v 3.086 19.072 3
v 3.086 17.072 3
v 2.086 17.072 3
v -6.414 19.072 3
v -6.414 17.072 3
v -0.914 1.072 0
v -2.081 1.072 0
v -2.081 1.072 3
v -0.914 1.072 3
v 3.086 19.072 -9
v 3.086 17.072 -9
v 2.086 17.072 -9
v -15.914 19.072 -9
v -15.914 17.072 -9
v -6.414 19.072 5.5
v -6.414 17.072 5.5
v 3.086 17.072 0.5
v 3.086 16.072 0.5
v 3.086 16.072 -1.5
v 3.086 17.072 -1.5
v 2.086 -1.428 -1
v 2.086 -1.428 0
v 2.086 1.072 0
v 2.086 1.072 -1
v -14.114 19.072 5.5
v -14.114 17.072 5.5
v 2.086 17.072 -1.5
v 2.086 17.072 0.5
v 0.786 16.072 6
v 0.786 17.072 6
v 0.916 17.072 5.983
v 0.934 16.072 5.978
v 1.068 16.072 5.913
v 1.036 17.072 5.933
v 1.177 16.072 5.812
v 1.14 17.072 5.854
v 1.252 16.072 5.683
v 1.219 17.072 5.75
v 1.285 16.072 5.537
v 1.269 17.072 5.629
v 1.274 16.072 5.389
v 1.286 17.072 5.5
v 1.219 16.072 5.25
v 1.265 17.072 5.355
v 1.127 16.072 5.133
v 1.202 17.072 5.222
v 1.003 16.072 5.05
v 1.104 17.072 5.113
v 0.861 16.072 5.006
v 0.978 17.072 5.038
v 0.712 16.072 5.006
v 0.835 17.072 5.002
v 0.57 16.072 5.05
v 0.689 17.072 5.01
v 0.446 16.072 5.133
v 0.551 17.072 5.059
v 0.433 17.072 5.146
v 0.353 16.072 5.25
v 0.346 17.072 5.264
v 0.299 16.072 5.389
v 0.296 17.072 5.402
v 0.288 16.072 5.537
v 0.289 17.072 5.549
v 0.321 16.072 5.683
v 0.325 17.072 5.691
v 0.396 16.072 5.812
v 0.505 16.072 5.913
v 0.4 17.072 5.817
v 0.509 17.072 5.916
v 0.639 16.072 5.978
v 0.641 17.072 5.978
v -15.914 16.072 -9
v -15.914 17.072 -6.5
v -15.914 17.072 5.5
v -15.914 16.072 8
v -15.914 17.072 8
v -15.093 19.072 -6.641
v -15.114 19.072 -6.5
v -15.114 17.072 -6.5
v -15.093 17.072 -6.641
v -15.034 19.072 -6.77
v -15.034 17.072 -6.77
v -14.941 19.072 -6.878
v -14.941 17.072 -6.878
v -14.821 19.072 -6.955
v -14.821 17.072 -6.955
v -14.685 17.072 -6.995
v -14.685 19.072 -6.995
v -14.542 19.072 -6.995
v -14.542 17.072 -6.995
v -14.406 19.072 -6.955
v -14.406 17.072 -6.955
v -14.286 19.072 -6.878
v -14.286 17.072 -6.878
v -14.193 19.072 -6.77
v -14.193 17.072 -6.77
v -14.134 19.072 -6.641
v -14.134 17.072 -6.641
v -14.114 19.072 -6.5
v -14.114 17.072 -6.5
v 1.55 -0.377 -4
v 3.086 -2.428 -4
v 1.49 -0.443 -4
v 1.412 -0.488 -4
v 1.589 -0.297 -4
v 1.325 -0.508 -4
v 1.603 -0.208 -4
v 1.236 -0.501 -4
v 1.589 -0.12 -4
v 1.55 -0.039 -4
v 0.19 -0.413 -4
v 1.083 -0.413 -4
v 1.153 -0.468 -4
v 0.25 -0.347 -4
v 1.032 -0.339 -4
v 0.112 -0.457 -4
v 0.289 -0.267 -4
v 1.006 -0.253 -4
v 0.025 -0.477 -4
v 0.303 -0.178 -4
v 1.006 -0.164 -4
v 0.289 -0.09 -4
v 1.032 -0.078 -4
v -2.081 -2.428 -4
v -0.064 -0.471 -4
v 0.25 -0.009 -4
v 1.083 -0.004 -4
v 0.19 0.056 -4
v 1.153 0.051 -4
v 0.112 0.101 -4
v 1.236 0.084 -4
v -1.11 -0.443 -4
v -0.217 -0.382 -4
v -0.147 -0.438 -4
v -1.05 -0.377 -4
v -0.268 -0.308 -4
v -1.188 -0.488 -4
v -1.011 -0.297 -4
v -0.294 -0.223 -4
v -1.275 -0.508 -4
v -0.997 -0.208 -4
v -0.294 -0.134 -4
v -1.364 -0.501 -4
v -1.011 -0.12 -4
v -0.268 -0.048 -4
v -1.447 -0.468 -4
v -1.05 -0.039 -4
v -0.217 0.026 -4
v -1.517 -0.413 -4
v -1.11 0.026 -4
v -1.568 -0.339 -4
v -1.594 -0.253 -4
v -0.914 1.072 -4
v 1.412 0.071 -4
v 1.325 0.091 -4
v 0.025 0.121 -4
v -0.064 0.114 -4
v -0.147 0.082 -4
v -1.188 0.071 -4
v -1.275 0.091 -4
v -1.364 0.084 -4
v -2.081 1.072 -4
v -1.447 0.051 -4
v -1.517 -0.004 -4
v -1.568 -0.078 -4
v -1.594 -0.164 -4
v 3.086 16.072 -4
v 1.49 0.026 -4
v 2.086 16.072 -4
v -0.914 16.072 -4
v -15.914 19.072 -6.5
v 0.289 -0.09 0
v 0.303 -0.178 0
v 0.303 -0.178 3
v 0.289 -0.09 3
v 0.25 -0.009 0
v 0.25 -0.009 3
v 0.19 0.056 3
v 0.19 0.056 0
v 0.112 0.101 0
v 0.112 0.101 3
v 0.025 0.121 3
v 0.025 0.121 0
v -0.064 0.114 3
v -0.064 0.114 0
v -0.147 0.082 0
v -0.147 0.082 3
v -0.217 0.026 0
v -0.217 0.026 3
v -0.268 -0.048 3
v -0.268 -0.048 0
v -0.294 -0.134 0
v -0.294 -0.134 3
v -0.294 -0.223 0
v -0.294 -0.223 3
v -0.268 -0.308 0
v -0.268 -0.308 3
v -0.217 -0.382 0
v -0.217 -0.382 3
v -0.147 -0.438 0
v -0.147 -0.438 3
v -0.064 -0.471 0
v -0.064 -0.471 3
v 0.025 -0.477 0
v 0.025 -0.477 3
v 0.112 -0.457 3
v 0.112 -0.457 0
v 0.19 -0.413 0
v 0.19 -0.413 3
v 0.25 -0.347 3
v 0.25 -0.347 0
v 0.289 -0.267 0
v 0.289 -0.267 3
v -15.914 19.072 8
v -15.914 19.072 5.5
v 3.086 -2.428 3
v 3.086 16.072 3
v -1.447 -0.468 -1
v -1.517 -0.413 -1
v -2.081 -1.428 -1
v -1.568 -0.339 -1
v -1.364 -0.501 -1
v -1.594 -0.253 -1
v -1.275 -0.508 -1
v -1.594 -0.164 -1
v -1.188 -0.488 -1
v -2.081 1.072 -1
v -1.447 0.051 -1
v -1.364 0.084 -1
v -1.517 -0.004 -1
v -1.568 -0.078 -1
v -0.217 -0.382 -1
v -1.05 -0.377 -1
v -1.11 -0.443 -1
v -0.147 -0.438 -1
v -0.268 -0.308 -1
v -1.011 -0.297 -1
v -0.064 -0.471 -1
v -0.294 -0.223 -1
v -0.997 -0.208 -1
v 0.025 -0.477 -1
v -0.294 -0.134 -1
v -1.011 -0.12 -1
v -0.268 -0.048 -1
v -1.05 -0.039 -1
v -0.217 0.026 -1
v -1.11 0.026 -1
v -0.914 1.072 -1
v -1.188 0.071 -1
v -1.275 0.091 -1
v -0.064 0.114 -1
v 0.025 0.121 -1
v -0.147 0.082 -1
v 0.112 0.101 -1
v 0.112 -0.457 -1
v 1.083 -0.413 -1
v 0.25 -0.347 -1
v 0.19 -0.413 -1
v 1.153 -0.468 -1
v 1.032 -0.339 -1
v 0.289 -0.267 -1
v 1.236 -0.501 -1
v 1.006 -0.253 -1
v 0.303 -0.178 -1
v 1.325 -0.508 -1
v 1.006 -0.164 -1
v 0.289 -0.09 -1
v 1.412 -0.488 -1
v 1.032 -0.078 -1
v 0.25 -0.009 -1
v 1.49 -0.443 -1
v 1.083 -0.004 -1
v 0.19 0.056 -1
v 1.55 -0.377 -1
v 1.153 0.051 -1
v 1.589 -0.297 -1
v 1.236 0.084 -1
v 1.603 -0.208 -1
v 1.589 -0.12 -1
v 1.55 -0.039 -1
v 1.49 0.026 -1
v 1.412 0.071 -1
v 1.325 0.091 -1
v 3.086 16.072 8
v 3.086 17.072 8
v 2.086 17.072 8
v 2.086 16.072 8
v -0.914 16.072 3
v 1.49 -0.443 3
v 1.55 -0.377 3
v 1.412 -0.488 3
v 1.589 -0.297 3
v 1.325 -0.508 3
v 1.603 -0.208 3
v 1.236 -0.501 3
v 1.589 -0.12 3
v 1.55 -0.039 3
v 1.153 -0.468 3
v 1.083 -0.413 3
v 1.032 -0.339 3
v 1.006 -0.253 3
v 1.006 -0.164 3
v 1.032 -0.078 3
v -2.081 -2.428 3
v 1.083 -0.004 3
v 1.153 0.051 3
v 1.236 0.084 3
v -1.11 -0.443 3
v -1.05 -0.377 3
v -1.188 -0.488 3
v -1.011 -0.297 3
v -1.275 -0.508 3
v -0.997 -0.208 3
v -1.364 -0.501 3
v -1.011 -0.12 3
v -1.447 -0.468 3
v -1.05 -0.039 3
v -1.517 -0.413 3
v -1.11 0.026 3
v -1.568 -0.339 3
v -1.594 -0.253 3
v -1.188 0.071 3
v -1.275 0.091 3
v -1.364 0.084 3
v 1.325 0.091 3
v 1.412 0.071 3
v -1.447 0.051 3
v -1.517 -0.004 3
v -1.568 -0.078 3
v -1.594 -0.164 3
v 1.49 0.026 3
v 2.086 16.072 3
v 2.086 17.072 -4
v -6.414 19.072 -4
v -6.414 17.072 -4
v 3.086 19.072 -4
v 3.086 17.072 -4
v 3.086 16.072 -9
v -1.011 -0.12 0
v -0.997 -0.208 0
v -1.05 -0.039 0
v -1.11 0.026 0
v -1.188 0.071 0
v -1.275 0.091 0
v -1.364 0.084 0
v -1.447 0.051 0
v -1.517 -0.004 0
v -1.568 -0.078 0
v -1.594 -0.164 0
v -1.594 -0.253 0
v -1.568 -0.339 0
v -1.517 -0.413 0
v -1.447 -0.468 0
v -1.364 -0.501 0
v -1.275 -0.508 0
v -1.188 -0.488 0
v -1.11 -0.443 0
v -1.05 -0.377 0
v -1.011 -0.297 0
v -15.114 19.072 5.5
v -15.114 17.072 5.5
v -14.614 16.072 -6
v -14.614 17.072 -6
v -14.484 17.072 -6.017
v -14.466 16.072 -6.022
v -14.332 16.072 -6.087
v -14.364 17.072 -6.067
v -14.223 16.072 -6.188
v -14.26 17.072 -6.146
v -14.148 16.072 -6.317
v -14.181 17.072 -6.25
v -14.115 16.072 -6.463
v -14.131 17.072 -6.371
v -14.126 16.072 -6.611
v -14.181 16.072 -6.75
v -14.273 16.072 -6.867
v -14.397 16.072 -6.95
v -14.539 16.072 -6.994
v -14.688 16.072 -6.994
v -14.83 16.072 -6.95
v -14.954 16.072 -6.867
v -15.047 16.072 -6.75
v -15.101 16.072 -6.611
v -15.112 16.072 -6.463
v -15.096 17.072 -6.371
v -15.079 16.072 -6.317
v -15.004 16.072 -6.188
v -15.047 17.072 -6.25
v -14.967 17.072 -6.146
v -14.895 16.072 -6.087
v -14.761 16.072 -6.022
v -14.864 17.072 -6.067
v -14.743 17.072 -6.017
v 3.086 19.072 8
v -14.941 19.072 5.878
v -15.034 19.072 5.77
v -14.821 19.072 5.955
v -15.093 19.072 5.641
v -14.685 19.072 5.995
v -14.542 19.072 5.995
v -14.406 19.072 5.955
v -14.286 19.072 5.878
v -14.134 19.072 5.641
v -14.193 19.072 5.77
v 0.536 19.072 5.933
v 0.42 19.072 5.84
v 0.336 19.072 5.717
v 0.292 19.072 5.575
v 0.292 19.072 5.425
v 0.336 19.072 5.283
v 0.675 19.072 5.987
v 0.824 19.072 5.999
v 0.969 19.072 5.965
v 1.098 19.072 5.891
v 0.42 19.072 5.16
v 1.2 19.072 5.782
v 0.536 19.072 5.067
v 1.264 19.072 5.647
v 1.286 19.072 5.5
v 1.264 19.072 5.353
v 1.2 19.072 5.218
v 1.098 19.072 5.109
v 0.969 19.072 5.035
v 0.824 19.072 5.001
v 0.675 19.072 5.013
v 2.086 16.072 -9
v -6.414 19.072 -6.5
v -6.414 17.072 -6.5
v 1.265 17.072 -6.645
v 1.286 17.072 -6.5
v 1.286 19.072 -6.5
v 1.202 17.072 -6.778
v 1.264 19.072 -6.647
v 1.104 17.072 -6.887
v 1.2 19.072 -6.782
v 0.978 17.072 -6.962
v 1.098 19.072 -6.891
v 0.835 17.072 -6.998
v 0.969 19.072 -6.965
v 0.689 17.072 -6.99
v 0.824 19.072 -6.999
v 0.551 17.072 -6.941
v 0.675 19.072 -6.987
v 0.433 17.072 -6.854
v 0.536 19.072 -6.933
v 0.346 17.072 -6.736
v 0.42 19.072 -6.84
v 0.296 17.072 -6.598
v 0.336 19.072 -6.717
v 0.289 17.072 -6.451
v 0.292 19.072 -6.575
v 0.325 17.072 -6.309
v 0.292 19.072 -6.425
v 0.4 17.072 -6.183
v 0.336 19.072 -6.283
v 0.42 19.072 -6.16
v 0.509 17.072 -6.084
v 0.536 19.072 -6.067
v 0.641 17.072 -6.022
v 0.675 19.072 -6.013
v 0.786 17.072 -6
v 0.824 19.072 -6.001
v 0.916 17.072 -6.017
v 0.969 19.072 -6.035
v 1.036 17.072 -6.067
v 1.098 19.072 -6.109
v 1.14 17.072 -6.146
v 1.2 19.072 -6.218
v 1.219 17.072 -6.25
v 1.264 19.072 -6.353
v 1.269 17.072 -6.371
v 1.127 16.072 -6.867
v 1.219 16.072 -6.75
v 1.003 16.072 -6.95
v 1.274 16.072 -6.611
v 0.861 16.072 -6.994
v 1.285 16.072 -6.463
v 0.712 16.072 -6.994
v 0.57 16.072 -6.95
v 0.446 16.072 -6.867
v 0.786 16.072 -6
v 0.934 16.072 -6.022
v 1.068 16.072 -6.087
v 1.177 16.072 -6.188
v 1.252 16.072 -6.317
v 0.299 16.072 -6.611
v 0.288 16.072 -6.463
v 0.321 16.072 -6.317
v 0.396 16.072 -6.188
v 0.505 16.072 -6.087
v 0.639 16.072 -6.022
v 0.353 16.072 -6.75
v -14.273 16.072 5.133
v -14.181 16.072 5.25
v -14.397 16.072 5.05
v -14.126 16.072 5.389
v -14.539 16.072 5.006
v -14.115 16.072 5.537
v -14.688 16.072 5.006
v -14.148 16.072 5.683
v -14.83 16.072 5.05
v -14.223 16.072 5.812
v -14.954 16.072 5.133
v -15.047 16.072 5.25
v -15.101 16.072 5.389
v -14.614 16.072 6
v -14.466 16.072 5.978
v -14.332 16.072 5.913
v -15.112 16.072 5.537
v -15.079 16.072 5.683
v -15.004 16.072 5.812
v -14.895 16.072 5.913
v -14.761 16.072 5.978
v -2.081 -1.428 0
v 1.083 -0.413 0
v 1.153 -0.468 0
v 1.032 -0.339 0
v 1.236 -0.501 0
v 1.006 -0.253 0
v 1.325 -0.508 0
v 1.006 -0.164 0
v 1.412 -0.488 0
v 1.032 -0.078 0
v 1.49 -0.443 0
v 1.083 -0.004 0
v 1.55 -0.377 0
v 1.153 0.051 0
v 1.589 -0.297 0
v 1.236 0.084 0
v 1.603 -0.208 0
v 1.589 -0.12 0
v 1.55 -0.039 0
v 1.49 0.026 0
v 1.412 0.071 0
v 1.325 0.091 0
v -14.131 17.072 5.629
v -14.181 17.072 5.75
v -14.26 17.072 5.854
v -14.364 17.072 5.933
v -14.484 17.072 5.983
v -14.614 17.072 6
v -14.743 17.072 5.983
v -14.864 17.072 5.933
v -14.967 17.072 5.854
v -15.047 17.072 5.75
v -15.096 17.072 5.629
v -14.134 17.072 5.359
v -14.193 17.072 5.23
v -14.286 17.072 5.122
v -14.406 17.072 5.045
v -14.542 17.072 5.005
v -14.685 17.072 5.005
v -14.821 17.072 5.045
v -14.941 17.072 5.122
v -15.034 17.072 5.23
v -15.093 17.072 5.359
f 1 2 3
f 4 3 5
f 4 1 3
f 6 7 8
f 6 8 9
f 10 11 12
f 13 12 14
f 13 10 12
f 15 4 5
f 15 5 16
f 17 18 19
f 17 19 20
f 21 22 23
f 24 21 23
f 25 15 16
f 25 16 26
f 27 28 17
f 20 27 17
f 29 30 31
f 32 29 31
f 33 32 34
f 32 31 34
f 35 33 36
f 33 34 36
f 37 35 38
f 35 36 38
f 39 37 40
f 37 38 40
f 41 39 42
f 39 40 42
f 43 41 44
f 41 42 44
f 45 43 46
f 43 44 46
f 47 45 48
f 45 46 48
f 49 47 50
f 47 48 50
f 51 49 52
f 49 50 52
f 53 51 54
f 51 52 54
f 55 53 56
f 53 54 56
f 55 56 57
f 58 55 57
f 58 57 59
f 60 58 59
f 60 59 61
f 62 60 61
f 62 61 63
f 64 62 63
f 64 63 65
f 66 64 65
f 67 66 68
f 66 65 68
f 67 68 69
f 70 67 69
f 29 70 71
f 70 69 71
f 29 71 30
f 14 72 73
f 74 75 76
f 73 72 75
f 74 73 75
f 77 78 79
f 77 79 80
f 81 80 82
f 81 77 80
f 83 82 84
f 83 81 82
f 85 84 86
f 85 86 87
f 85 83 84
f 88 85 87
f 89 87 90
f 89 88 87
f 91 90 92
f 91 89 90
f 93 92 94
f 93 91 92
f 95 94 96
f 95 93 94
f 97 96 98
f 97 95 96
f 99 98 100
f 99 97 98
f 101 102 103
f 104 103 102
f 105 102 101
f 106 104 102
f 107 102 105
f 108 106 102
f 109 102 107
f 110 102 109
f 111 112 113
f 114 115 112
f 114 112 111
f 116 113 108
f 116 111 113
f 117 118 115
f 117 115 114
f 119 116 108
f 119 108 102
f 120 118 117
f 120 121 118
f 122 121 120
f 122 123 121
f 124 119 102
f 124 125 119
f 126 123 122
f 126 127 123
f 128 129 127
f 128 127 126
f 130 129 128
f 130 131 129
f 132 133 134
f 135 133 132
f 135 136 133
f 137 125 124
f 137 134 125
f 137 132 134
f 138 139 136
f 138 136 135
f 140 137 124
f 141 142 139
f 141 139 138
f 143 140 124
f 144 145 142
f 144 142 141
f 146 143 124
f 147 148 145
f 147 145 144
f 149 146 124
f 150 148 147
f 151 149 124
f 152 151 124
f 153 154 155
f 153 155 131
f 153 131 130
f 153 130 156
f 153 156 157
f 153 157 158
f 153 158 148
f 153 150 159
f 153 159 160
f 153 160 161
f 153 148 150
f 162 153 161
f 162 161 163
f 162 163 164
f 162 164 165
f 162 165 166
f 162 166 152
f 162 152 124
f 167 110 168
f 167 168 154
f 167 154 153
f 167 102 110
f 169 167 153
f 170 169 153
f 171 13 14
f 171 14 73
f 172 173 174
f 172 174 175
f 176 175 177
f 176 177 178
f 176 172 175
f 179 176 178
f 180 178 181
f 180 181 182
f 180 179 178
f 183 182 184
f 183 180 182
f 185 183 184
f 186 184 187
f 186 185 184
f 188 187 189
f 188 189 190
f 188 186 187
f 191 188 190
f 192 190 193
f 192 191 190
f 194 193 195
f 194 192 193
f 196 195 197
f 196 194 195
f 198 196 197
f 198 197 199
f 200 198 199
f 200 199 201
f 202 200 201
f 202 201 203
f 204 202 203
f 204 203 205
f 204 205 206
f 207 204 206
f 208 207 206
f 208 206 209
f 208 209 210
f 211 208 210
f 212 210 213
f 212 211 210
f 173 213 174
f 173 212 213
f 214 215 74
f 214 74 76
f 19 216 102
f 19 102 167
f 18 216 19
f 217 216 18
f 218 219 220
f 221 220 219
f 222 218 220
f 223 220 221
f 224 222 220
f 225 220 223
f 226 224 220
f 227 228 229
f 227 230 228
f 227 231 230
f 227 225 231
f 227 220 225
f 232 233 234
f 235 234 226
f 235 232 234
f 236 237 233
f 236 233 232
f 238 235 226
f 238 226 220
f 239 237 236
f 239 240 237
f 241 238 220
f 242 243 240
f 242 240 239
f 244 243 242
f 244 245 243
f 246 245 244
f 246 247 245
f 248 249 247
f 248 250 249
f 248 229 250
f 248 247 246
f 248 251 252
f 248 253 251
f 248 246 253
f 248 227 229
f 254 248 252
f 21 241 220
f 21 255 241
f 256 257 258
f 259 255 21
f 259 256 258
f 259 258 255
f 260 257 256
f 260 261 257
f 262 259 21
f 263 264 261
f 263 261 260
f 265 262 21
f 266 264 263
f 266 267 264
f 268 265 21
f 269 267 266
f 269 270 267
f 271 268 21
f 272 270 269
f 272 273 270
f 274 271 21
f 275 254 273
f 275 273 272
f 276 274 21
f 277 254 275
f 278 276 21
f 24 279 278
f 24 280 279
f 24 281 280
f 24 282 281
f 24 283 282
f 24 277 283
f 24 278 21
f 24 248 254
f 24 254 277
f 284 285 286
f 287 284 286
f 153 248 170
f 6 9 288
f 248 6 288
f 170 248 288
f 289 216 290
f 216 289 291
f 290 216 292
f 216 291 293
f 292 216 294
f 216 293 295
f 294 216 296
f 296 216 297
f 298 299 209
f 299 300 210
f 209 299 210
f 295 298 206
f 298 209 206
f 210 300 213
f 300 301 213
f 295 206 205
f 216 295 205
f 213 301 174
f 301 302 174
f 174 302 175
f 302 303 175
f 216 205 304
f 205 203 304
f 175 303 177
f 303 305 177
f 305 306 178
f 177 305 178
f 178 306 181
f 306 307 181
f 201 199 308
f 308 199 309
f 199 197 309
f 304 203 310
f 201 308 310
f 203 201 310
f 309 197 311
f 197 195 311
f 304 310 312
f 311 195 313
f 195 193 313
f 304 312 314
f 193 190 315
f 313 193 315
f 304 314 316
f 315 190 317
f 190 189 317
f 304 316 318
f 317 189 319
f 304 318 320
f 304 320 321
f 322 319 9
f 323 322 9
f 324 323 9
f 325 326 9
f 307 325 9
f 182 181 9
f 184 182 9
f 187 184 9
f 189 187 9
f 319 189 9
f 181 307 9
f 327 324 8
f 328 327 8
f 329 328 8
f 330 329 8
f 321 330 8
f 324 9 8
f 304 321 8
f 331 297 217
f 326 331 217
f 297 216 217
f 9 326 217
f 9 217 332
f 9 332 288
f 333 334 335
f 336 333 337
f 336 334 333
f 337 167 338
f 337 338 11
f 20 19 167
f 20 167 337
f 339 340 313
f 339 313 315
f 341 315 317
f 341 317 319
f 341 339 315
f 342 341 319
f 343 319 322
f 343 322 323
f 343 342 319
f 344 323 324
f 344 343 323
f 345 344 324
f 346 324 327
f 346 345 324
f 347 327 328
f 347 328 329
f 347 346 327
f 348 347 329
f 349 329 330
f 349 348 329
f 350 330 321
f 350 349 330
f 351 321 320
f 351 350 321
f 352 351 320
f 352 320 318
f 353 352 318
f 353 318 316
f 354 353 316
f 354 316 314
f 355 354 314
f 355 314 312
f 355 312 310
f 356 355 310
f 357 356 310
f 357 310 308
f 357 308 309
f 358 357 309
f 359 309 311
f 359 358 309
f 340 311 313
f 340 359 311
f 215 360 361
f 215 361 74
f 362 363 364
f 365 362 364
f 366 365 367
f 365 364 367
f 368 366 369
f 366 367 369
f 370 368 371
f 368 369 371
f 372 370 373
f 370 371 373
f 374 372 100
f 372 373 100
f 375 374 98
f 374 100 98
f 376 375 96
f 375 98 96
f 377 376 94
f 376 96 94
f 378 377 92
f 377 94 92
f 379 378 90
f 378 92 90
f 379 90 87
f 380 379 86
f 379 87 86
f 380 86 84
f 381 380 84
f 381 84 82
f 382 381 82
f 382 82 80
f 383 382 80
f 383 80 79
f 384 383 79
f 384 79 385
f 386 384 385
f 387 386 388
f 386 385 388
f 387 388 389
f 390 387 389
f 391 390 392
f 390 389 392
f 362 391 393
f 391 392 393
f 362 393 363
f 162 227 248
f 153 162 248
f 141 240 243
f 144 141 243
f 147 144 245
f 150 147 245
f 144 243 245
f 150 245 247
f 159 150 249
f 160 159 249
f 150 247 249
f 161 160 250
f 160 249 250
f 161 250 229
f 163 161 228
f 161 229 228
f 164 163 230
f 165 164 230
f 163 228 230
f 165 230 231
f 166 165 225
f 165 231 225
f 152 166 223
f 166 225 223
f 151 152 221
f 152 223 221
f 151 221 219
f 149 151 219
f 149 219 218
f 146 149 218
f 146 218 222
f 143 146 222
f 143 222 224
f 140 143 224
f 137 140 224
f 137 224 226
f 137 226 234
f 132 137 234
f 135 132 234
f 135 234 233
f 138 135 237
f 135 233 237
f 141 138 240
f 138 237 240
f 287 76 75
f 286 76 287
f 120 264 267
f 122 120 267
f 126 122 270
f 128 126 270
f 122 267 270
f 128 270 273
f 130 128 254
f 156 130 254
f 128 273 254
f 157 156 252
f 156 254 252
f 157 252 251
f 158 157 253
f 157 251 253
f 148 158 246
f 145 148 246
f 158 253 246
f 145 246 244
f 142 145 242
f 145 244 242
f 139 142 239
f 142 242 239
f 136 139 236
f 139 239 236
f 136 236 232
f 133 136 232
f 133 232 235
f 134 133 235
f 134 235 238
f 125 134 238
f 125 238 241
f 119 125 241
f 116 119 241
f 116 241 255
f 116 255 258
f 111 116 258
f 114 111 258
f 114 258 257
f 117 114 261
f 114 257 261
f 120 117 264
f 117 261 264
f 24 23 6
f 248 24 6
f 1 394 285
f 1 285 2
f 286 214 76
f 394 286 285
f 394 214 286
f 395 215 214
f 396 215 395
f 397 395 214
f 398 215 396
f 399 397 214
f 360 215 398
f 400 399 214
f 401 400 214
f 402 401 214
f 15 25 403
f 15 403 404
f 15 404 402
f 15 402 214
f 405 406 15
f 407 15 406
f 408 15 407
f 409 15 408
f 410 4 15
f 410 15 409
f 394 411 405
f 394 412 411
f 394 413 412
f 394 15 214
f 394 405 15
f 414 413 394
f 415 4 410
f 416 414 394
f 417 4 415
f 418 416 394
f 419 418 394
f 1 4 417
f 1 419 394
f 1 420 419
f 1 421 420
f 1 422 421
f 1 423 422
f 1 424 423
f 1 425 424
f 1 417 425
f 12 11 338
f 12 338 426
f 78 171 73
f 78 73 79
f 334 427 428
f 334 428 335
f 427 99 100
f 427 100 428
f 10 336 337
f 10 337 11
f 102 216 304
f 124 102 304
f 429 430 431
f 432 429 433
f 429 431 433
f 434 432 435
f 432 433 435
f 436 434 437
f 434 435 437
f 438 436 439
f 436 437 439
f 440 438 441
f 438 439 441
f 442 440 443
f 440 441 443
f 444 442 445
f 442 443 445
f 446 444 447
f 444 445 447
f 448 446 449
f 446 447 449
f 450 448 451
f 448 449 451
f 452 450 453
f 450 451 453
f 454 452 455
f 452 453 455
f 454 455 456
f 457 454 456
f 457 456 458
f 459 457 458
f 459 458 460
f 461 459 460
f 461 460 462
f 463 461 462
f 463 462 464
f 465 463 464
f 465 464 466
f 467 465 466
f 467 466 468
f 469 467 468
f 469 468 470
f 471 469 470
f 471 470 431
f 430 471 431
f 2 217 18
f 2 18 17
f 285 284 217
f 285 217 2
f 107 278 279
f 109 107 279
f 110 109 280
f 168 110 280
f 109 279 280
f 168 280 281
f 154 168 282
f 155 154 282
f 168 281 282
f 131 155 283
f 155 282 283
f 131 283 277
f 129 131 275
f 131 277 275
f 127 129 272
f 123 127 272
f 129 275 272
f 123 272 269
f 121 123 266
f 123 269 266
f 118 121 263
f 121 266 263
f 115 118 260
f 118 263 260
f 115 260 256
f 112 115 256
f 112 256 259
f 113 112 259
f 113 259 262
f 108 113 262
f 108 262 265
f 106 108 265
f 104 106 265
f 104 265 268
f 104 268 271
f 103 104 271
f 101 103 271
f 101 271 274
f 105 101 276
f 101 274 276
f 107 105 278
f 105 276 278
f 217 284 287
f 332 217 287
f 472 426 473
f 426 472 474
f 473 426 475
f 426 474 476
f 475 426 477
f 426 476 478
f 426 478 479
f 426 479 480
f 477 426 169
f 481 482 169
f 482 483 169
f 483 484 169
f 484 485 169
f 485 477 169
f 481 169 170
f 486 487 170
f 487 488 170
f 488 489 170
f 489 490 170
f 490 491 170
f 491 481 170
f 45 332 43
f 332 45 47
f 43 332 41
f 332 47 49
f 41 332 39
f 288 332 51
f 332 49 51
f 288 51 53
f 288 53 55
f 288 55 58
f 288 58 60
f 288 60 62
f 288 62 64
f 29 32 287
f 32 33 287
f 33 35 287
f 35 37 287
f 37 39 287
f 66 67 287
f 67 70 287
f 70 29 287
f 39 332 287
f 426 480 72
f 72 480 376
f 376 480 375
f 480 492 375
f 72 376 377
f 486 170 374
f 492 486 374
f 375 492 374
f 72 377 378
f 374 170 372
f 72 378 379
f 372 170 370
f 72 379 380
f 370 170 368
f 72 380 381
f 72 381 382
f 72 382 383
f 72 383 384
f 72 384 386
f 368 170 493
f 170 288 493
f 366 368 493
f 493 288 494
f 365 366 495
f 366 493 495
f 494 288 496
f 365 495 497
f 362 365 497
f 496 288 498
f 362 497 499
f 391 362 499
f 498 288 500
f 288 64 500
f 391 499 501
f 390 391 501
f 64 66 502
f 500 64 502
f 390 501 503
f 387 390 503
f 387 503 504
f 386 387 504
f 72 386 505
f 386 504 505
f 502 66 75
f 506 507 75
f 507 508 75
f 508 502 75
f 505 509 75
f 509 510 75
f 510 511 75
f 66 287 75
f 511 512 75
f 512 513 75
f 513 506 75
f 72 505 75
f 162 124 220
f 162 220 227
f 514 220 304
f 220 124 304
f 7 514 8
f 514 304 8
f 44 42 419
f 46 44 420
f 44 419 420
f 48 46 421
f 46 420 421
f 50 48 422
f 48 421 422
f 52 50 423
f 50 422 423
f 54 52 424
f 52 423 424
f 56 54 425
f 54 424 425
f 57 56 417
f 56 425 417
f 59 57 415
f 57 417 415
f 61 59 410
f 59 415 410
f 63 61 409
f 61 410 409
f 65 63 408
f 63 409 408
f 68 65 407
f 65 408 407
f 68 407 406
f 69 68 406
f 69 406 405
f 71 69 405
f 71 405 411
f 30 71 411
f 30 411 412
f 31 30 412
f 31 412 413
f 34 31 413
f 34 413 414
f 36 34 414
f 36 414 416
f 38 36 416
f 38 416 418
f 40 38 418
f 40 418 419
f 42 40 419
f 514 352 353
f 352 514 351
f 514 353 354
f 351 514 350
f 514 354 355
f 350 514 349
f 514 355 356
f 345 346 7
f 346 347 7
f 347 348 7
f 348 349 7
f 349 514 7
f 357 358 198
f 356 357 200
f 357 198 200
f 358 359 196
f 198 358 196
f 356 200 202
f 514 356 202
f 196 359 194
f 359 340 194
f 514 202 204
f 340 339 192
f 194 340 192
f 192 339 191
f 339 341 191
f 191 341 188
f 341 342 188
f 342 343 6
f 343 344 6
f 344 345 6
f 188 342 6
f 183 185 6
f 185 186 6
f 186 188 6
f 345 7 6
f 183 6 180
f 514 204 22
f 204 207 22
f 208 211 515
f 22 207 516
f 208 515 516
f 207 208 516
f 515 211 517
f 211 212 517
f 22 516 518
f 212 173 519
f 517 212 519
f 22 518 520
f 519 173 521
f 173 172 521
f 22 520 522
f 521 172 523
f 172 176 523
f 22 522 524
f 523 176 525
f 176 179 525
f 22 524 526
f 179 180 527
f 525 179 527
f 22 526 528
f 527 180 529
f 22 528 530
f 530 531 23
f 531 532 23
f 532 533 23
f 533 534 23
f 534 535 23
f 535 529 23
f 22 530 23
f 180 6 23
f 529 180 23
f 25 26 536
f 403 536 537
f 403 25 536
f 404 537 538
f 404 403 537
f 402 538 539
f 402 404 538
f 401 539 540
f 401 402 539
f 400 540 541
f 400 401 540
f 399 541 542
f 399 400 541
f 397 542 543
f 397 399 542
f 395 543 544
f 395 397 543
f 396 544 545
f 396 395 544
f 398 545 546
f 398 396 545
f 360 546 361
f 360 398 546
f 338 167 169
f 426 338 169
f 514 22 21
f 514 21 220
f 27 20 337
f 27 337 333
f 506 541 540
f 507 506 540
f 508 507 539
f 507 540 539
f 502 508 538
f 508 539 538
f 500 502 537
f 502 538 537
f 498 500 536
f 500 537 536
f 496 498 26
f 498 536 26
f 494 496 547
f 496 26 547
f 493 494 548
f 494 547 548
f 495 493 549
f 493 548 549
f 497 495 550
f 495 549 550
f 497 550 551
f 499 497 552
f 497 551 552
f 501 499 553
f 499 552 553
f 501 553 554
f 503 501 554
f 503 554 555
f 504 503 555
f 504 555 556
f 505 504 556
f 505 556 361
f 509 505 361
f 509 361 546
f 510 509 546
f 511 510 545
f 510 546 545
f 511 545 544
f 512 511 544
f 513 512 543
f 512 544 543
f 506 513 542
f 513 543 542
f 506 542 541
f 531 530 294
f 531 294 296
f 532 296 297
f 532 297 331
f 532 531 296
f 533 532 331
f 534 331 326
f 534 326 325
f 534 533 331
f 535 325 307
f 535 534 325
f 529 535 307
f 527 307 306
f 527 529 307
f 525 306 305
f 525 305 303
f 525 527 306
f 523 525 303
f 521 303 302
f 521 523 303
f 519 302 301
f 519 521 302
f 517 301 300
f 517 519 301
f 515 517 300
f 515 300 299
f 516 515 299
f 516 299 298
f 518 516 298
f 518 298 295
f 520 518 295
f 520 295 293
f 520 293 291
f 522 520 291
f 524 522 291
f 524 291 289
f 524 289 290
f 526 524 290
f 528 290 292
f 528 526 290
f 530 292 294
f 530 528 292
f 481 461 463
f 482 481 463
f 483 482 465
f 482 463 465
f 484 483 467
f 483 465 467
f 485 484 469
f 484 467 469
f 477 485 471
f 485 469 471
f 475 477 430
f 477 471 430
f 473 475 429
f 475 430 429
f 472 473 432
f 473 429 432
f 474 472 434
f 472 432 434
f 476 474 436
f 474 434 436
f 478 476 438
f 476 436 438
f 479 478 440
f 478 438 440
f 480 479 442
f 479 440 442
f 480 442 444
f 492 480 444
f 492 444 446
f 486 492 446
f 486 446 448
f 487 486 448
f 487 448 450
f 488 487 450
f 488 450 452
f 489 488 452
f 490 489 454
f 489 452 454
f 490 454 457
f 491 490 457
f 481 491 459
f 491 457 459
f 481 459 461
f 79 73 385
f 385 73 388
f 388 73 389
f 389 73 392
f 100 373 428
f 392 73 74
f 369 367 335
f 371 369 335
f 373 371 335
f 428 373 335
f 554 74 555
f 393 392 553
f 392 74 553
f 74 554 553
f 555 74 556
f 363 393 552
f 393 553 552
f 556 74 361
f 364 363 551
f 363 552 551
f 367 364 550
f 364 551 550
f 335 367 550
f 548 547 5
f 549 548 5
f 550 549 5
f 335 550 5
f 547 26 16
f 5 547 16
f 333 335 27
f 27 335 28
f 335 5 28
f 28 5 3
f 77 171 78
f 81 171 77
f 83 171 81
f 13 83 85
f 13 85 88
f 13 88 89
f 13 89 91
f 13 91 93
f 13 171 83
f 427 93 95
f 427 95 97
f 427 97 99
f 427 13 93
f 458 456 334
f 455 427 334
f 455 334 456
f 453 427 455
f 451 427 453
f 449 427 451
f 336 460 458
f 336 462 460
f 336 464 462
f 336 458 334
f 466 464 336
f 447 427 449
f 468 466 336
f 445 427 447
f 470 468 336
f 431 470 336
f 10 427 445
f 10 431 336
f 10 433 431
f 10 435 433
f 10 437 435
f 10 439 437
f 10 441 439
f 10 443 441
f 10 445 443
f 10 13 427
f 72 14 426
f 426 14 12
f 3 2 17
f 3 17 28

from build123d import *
from build123d.topology import SkipClean

# Parameters (mm, degrees)
SKETCH3_W                = 4.167944103
SKETCH3_H                = 2.5
SKETCH3_R                = 0.3
BOSS_EXTRUDE1_DEPTH      = 3
SKETCH6_W                = 3
SKETCH6_H                = 15
BOSS_EXTRUDE3_DEPTH      = 3
BOSS_EXTRUDE4_DEPTH      = 8
SKETCH7_R                = 0.5
CUT_EXTRUDE1_DEPTH       = 1
BOSS_EXTRUDE5_DEPTH      = 1
BOSS_EXTRUDE5_DEPTH_BACK = 1
BOSS_EXTRUDE6_DEPTH      = 3.5
BOSS_EXTRUDE6_DEPTH_BACK = 3.5
SKETCH8_5_W              = 4.167944103
SKETCH8_5_H              = 1
BOSS_EXTRUDE7_DEPTH      = 3.5
BOSS_EXTRUDE7_DEPTH_BACK = 3.5
BOSS_EXTRUDE8_START      = 2
SKETCH9_R                = 0.5
BOSS_EXTRUDE8_DEPTH      = 2
BOSS_EXTRUDE9_DEPTH      = 8.5
BOSS_EXTRUDE9_DEPTH_BACK = 8.5
SKETCH8_7_W              = 1
SKETCH8_7_H              = 1


with BuildPart() as part:
    # Sketch3 → Boss-Extrude1 (new body)
    with BuildSketch(Plane.XY):
        with Locations((0.002500359, -0.178234892)):
            Rectangle(SKETCH3_W, SKETCH3_H)
        with Locations((-1.297499642, -0.208485146)):
            Circle(SKETCH3_R, mode=Mode.SUBTRACT)
        with Locations((1.302500358, -0.208485146)):
            Circle(SKETCH3_R, mode=Mode.SUBTRACT)
        with Locations((0.002500358, -0.178234892)):
            Circle(SKETCH3_R, mode=Mode.SUBTRACT)
    extrude(amount=BOSS_EXTRUDE1_DEPTH)

    # Sketch6 → Boss-Extrude3 (add)
    with BuildSketch(Plane.XY):
        with Locations((0.58647241, 8.571765108)):
            Rectangle(SKETCH6_W, SKETCH6_H)
        Polygon((-0.91352759, 16.071765108), (2.08647241, 16.071765108), (2.08647241, 17.071765108), (-15.91352759, 17.071765108), (-15.91352759, 16.071765108), align=None)
    extrude(amount=BOSS_EXTRUDE3_DEPTH)

    # Sketch6<5> → Boss-Extrude4 (add)
    with BuildSketch(Plane.XY):
        Polygon((-0.91352759, 16.071765108), (2.08647241, 16.071765108), (2.08647241, 17.071765108), (-15.91352759, 17.071765108), (-15.91352759, 16.071765108), align=None)
    extrude(amount=BOSS_EXTRUDE4_DEPTH)


with BuildPart() as body_2:
    # Mirror4: mirrored copy
    add(part.part.mirror(Plane(origin=(0, 0, -0.5), x_dir=(1, 0, 0), z_dir=(0, 0, -1))))


with BuildPart() as cut_extrude1_tool:
    # Sketch7 → Cut-Extrude1 (new body)
    with BuildSketch(Plane(origin=(0, 17.071765108, 0), x_dir=(1, 0, 0), z_dir=(0, 1, 0))):
        with Locations((-14.61352759, -5.5)):
            Circle(SKETCH7_R)
        with Locations((-14.61352759, 6.5)):
            Circle(SKETCH7_R)
        with Locations((0.78647241, -5.5)):
            Circle(SKETCH7_R)
        with Locations((0.78647241, 6.5)):
            Circle(SKETCH7_R)
    extrude(amount=-CUT_EXTRUDE1_DEPTH)


with BuildPart() as part_1:
    add(part.part)

    # Cut-Extrude1: cut by cut_extrude1_tool
    add(cut_extrude1_tool.part, mode=Mode.SUBTRACT)



with BuildPart() as body_2_1:
    add(body_2.part)

    # Cut-Extrude1: cut by cut_extrude1_tool
    add(cut_extrude1_tool.part, mode=Mode.SUBTRACT)


with BuildPart() as part_2:
    add(part_1.part)

    add(body_2_1.part)  # Boss-Extrude5 merges body 2
    # Sketch8 → Boss-Extrude5 (add, two sides: drawn at the far end of the back side and taken through both)
    with BuildSketch(Plane(origin=(0, 0, -0.5), x_dir=(-1, 0, 0), z_dir=(0, 0, -1)).offset(-BOSS_EXTRUDE5_DEPTH_BACK)):
        Polygon((2.081471693, -2.428234892), (2.081471693, -1.428234892), (-2.08647241, -1.428234892), (-2.08647241, 1.071765108), (0.91352759, 1.071765108), (0.91352759, 16.071765108), (15.91352759, 16.071765108), (15.91352759, 17.071765108), (-3.08647241, 17.071765108), (-3.08647241, -2.428234892), align=None)
    extrude(amount=BOSS_EXTRUDE5_DEPTH + BOSS_EXTRUDE5_DEPTH_BACK)

    # Sketch8<5> → Boss-Extrude6 (add, two sides: drawn at the far end of the back side and taken through both)
    with BuildSketch(Plane(origin=(0, 0, -0.5), x_dir=(-1, 0, 0), z_dir=(0, 0, -1)).offset(-BOSS_EXTRUDE6_DEPTH_BACK)):
        with Locations((-0.002500359, -1.928234892)):
            Rectangle(SKETCH8_5_W, SKETCH8_5_H)
    extrude(amount=BOSS_EXTRUDE6_DEPTH + BOSS_EXTRUDE6_DEPTH_BACK)

    # Sketch8<6> → Boss-Extrude7 (add, two sides: drawn at the far end of the back side and taken through both)
    with BuildSketch(Plane(origin=(0, 0, -0.5), x_dir=(-1, 0, 0), z_dir=(0, 0, -1)).offset(-BOSS_EXTRUDE7_DEPTH_BACK)):
        Polygon((-2.08647241, -2.428234892), (-2.08647241, -1.428234892), (-2.08647241, 1.071765108), (-2.08647241, 16.071765108), (-3.08647241, 16.071765108), (-3.08647241, -2.428234892), align=None)
    extrude(amount=BOSS_EXTRUDE7_DEPTH + BOSS_EXTRUDE7_DEPTH_BACK)

    # Sketch9 → Boss-Extrude8 (add)
    # profile 1 of 2: a face of its own
    with SkipClean():  # the faces are left unmerged after this step: merging them gives an invalid solid
        with BuildSketch(Plane(origin=(0, 17.071765108, 0), x_dir=(1, 0, 0), z_dir=(0, 1, 0)).offset(BOSS_EXTRUDE8_START)):
            with BuildLine():
                Line((-15.11352759, -5.5), (-15.91352759, -5.5))
                Line((-15.91352759, -5.5), (-15.91352759, -8))
                Line((-15.91352759, -8), (3.08647241, -8))
                Line((3.08647241, -8), (3.08647241, -3))
                Line((3.08647241, -3), (-6.41352759, -3))
                Line((-6.41352759, -3), (-6.41352759, -5.5))
                Line((-6.41352759, -5.5), (-14.11352759, -5.5))
                ThreePointArc((-14.11352759, -5.5), (-14.61352759, -6), (-15.11352759, -5.5))
            make_face()
            with Locations((0.78647241, -5.5)):
                Circle(SKETCH9_R, mode=Mode.SUBTRACT)
        # profile 2 of 2: a face of its own
        with BuildSketch(Plane(origin=(0, 17.071765108, 0), x_dir=(1, 0, 0), z_dir=(0, 1, 0)).offset(BOSS_EXTRUDE8_START)):
            with BuildLine():
                Line((-6.41352759, 6.5), (-6.41352759, 4))
                Line((-6.41352759, 4), (3.08647241, 4))
                Line((3.08647241, 4), (3.08647241, 9))
                Line((3.08647241, 9), (-15.91352759, 9))
                Line((-15.91352759, 9), (-15.91352759, 6.5))
                Line((-15.91352759, 6.5), (-15.11352759, 6.5))
                ThreePointArc((-15.11352759, 6.5), (-14.61352759, 7), (-14.11352759, 6.5))
                Line((-14.11352759, 6.5), (-6.41352759, 6.5))
            make_face()
            with Locations((0.78647241, 6.5)):
                Circle(SKETCH9_R, mode=Mode.SUBTRACT)
        extrude(amount=-BOSS_EXTRUDE8_DEPTH)

    # Sketch8<7> → Boss-Extrude9 (add, two sides: drawn at the far end of the back side and taken through both)
    with SkipClean():  # the faces are left unmerged after this step: merging them gives an invalid solid
        with BuildSketch(Plane(origin=(0, 0, -0.5), x_dir=(-1, 0, 0), z_dir=(0, 0, -1)).offset(-BOSS_EXTRUDE9_DEPTH_BACK)):
            with Locations((-2.58647241, 16.571765108)):
                Rectangle(SKETCH8_7_W, SKETCH8_7_H)
        extrude(amount=BOSS_EXTRUDE9_DEPTH + BOSS_EXTRUDE9_DEPTH_BACK)


solid = part_2.part
